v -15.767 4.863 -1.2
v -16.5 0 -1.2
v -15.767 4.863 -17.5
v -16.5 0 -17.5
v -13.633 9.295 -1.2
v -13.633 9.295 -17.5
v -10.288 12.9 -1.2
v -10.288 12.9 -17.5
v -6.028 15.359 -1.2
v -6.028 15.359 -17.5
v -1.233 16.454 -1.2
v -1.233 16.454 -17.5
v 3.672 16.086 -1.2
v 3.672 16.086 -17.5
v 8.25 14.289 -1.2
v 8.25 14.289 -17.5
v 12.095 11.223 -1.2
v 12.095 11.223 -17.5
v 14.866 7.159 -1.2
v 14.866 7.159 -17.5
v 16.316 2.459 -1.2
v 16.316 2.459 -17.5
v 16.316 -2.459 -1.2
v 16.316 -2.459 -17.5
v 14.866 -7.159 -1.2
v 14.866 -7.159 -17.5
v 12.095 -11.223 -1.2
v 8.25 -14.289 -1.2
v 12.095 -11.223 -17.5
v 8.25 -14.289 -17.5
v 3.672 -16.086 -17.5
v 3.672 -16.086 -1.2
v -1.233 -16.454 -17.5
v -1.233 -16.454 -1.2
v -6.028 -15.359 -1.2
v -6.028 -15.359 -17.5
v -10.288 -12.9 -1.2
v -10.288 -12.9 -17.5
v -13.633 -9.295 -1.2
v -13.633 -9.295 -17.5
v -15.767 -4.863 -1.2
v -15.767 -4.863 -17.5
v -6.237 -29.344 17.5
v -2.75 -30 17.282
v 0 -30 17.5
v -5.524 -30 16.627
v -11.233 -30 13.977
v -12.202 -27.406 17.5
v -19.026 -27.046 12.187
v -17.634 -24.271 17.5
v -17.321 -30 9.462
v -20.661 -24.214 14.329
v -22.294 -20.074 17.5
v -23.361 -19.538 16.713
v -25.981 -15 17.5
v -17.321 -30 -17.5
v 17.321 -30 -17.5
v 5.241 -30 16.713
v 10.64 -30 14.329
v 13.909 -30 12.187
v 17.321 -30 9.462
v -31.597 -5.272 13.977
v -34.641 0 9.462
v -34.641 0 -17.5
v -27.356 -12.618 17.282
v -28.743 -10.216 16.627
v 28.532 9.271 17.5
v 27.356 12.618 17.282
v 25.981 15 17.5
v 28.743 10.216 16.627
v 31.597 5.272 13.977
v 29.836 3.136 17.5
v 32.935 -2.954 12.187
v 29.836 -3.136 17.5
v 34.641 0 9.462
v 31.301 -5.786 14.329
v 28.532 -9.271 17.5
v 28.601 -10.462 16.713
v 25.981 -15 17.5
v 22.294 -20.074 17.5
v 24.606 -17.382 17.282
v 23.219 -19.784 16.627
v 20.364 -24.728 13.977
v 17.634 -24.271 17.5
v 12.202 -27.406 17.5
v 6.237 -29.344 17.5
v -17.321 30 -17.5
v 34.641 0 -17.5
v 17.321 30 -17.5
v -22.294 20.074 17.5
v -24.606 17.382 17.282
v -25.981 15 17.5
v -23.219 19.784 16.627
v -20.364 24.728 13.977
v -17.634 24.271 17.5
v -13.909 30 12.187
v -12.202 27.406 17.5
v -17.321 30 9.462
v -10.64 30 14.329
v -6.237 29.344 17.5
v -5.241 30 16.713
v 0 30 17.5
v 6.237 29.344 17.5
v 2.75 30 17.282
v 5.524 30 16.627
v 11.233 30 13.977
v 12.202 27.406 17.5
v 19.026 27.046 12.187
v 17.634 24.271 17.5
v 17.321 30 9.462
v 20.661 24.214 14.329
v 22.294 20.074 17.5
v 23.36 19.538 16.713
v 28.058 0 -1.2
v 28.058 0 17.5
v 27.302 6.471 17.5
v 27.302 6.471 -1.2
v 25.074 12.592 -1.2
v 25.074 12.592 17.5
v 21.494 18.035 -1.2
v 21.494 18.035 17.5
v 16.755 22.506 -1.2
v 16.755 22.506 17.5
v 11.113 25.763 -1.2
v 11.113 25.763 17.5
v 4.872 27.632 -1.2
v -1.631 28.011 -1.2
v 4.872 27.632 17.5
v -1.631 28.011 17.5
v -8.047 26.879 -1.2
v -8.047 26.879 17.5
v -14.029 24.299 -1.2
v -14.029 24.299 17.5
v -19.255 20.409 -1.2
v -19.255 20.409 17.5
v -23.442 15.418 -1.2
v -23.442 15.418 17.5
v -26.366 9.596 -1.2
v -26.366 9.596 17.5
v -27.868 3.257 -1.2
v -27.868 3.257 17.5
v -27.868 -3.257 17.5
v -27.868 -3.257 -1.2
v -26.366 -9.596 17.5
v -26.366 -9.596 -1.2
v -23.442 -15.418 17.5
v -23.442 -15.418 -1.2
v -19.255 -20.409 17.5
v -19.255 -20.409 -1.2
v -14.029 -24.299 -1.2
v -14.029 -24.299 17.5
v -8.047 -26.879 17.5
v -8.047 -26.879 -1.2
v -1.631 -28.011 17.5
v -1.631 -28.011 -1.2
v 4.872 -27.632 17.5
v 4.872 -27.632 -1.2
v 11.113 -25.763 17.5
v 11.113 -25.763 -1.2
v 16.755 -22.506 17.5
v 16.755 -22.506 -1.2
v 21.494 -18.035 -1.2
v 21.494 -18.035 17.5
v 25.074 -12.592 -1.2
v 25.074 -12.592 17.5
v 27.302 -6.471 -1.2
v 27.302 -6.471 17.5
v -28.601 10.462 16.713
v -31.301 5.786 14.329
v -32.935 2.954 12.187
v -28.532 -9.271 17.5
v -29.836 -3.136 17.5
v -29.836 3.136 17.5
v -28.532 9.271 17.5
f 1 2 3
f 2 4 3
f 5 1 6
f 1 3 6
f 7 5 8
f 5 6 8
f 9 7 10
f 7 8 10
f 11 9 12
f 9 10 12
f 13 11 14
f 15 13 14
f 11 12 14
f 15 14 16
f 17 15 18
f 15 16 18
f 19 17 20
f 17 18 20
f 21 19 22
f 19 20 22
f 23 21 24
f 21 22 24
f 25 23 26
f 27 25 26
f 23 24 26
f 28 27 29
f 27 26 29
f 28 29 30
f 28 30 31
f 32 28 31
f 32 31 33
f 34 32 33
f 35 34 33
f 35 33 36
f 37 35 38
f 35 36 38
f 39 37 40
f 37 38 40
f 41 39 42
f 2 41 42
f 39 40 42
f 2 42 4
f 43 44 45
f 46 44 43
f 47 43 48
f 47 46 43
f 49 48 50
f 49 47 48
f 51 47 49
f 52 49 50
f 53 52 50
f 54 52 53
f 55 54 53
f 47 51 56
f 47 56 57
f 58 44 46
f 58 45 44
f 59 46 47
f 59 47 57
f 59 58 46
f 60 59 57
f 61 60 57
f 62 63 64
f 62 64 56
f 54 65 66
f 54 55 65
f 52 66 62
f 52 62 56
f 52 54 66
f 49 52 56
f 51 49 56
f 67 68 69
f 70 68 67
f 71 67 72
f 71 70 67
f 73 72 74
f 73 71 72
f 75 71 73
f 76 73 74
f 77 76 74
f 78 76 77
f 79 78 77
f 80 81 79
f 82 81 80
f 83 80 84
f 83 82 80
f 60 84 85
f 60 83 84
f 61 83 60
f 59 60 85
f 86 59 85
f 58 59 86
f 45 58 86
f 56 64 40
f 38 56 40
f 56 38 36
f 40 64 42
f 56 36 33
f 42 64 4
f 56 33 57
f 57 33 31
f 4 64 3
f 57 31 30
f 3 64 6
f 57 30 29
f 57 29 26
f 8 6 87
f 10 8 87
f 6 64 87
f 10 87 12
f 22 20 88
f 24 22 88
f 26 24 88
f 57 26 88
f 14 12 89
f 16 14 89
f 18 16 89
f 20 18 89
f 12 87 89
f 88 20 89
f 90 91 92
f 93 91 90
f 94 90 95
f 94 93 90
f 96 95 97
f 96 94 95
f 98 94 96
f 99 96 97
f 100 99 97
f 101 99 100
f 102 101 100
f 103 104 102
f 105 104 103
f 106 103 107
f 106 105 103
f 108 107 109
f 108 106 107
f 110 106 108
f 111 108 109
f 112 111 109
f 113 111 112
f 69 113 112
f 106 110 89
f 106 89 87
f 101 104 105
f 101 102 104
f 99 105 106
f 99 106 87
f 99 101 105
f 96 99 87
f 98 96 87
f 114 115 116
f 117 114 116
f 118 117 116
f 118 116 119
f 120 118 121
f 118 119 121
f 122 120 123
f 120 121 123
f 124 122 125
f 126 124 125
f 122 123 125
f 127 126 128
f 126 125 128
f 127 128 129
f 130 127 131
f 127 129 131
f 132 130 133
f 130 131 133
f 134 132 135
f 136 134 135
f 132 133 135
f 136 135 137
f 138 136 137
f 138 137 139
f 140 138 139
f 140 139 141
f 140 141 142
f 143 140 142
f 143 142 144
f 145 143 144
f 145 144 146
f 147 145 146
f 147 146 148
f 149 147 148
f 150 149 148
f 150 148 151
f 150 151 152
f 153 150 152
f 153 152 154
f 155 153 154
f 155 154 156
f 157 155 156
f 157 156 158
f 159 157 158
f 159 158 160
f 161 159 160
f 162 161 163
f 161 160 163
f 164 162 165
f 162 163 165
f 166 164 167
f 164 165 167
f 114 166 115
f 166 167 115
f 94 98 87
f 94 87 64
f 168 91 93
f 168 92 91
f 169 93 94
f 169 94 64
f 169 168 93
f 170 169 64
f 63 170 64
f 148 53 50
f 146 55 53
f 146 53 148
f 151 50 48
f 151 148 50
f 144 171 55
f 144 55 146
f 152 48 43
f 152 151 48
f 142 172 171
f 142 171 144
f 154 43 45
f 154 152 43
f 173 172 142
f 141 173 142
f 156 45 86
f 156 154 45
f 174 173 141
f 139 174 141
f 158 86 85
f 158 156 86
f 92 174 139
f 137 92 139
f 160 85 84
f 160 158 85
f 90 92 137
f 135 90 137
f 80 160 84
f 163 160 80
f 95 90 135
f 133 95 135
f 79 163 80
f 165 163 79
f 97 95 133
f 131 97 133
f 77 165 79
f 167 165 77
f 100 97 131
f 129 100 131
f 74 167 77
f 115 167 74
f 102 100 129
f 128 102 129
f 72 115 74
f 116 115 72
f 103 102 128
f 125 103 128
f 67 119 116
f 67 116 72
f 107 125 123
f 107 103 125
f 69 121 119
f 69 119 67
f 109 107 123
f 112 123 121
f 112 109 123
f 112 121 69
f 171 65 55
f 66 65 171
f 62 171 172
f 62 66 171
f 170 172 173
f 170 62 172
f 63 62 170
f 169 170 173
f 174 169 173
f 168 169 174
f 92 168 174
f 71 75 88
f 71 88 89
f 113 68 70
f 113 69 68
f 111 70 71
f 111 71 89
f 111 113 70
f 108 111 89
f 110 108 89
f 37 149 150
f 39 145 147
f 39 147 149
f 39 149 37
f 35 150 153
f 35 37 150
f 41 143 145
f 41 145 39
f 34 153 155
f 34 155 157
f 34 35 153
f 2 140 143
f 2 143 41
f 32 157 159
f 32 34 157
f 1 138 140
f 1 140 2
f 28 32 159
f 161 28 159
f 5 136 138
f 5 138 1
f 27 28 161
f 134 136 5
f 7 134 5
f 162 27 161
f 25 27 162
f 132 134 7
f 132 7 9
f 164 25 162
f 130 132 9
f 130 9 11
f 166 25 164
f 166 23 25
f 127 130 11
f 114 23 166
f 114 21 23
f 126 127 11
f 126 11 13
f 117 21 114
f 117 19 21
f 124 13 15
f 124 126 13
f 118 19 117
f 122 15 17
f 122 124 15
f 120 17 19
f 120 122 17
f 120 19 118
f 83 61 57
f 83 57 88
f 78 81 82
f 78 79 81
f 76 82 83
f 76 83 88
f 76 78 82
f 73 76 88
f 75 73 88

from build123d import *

# Parameters (mm, degrees)
BOSS_EXTRUDE1_DEPTH                      = 17.5
SKETCH3_OUTSIDE_W                        = 131.318
SKETCH3_OUTSIDE_H                        = 122.036
SKETCH3_OUTSIDE_R                        = 30
CUT_EXTRUDE1_DEPTH                       = 17.5
CUT_EXTRUDE1_TAPER                       = 30
CUT_EXTRUDE1_OTHER_WAY_DEPTH             = 17.5
CUT_EXTRUDE1_OTHER_WAY_TAPER             = 30
CBORE_FOR_M30_HEX_HEAD_BOLT1_D           = 33
CBORE_FOR_M30_HEX_HEAD_BOLT1_CBORE_D     = 56.116
CBORE_FOR_M30_HEX_HEAD_BOLT1_CBORE_DEPTH = 18.7


with BuildPart() as part:
    # Sketch2 → Boss-Extrude1 (new, symmetric)
    with BuildSketch(Plane.XY):
        Polygon((34.641016151, 0), (17.320508076, 30), (-17.320508076, 30), (-34.641016151, 0), (-17.320508076, -30), (17.320508076, -30), align=None)
    extrude(amount=BOSS_EXTRUDE1_DEPTH, both=True)

    # Sketch3 outside → Cut-Extrude1 (cut)
    with BuildSketch(Plane.XY.offset(17.5)):
        Rectangle(SKETCH3_OUTSIDE_W, SKETCH3_OUTSIDE_H)
        Circle(SKETCH3_OUTSIDE_R, mode=Mode.SUBTRACT)
    extrude(amount=CUT_EXTRUDE1_DEPTH, taper=CUT_EXTRUDE1_TAPER, mode=Mode.SUBTRACT)

    # Sketch3 outside → Cut-Extrude1 other way (cut)
    with BuildSketch(Plane.XY.offset(17.5)):
        Rectangle(SKETCH3_OUTSIDE_W, SKETCH3_OUTSIDE_H)
        Circle(SKETCH3_OUTSIDE_R, mode=Mode.SUBTRACT)
    extrude(amount=-CUT_EXTRUDE1_OTHER_WAY_DEPTH, taper=CUT_EXTRUDE1_OTHER_WAY_TAPER, mode=Mode.SUBTRACT)

    # CBORE for M30 Hex Head Bolt1 (through all)
    with Locations(Plane.XY.offset(17.5)):
        with Locations((0, 0)):
            CounterBoreHole(CBORE_FOR_M30_HEX_HEAD_BOLT1_D / 2, CBORE_FOR_M30_HEX_HEAD_BOLT1_CBORE_D / 2, CBORE_FOR_M30_HEX_HEAD_BOLT1_CBORE_DEPTH)


solid = part.part
